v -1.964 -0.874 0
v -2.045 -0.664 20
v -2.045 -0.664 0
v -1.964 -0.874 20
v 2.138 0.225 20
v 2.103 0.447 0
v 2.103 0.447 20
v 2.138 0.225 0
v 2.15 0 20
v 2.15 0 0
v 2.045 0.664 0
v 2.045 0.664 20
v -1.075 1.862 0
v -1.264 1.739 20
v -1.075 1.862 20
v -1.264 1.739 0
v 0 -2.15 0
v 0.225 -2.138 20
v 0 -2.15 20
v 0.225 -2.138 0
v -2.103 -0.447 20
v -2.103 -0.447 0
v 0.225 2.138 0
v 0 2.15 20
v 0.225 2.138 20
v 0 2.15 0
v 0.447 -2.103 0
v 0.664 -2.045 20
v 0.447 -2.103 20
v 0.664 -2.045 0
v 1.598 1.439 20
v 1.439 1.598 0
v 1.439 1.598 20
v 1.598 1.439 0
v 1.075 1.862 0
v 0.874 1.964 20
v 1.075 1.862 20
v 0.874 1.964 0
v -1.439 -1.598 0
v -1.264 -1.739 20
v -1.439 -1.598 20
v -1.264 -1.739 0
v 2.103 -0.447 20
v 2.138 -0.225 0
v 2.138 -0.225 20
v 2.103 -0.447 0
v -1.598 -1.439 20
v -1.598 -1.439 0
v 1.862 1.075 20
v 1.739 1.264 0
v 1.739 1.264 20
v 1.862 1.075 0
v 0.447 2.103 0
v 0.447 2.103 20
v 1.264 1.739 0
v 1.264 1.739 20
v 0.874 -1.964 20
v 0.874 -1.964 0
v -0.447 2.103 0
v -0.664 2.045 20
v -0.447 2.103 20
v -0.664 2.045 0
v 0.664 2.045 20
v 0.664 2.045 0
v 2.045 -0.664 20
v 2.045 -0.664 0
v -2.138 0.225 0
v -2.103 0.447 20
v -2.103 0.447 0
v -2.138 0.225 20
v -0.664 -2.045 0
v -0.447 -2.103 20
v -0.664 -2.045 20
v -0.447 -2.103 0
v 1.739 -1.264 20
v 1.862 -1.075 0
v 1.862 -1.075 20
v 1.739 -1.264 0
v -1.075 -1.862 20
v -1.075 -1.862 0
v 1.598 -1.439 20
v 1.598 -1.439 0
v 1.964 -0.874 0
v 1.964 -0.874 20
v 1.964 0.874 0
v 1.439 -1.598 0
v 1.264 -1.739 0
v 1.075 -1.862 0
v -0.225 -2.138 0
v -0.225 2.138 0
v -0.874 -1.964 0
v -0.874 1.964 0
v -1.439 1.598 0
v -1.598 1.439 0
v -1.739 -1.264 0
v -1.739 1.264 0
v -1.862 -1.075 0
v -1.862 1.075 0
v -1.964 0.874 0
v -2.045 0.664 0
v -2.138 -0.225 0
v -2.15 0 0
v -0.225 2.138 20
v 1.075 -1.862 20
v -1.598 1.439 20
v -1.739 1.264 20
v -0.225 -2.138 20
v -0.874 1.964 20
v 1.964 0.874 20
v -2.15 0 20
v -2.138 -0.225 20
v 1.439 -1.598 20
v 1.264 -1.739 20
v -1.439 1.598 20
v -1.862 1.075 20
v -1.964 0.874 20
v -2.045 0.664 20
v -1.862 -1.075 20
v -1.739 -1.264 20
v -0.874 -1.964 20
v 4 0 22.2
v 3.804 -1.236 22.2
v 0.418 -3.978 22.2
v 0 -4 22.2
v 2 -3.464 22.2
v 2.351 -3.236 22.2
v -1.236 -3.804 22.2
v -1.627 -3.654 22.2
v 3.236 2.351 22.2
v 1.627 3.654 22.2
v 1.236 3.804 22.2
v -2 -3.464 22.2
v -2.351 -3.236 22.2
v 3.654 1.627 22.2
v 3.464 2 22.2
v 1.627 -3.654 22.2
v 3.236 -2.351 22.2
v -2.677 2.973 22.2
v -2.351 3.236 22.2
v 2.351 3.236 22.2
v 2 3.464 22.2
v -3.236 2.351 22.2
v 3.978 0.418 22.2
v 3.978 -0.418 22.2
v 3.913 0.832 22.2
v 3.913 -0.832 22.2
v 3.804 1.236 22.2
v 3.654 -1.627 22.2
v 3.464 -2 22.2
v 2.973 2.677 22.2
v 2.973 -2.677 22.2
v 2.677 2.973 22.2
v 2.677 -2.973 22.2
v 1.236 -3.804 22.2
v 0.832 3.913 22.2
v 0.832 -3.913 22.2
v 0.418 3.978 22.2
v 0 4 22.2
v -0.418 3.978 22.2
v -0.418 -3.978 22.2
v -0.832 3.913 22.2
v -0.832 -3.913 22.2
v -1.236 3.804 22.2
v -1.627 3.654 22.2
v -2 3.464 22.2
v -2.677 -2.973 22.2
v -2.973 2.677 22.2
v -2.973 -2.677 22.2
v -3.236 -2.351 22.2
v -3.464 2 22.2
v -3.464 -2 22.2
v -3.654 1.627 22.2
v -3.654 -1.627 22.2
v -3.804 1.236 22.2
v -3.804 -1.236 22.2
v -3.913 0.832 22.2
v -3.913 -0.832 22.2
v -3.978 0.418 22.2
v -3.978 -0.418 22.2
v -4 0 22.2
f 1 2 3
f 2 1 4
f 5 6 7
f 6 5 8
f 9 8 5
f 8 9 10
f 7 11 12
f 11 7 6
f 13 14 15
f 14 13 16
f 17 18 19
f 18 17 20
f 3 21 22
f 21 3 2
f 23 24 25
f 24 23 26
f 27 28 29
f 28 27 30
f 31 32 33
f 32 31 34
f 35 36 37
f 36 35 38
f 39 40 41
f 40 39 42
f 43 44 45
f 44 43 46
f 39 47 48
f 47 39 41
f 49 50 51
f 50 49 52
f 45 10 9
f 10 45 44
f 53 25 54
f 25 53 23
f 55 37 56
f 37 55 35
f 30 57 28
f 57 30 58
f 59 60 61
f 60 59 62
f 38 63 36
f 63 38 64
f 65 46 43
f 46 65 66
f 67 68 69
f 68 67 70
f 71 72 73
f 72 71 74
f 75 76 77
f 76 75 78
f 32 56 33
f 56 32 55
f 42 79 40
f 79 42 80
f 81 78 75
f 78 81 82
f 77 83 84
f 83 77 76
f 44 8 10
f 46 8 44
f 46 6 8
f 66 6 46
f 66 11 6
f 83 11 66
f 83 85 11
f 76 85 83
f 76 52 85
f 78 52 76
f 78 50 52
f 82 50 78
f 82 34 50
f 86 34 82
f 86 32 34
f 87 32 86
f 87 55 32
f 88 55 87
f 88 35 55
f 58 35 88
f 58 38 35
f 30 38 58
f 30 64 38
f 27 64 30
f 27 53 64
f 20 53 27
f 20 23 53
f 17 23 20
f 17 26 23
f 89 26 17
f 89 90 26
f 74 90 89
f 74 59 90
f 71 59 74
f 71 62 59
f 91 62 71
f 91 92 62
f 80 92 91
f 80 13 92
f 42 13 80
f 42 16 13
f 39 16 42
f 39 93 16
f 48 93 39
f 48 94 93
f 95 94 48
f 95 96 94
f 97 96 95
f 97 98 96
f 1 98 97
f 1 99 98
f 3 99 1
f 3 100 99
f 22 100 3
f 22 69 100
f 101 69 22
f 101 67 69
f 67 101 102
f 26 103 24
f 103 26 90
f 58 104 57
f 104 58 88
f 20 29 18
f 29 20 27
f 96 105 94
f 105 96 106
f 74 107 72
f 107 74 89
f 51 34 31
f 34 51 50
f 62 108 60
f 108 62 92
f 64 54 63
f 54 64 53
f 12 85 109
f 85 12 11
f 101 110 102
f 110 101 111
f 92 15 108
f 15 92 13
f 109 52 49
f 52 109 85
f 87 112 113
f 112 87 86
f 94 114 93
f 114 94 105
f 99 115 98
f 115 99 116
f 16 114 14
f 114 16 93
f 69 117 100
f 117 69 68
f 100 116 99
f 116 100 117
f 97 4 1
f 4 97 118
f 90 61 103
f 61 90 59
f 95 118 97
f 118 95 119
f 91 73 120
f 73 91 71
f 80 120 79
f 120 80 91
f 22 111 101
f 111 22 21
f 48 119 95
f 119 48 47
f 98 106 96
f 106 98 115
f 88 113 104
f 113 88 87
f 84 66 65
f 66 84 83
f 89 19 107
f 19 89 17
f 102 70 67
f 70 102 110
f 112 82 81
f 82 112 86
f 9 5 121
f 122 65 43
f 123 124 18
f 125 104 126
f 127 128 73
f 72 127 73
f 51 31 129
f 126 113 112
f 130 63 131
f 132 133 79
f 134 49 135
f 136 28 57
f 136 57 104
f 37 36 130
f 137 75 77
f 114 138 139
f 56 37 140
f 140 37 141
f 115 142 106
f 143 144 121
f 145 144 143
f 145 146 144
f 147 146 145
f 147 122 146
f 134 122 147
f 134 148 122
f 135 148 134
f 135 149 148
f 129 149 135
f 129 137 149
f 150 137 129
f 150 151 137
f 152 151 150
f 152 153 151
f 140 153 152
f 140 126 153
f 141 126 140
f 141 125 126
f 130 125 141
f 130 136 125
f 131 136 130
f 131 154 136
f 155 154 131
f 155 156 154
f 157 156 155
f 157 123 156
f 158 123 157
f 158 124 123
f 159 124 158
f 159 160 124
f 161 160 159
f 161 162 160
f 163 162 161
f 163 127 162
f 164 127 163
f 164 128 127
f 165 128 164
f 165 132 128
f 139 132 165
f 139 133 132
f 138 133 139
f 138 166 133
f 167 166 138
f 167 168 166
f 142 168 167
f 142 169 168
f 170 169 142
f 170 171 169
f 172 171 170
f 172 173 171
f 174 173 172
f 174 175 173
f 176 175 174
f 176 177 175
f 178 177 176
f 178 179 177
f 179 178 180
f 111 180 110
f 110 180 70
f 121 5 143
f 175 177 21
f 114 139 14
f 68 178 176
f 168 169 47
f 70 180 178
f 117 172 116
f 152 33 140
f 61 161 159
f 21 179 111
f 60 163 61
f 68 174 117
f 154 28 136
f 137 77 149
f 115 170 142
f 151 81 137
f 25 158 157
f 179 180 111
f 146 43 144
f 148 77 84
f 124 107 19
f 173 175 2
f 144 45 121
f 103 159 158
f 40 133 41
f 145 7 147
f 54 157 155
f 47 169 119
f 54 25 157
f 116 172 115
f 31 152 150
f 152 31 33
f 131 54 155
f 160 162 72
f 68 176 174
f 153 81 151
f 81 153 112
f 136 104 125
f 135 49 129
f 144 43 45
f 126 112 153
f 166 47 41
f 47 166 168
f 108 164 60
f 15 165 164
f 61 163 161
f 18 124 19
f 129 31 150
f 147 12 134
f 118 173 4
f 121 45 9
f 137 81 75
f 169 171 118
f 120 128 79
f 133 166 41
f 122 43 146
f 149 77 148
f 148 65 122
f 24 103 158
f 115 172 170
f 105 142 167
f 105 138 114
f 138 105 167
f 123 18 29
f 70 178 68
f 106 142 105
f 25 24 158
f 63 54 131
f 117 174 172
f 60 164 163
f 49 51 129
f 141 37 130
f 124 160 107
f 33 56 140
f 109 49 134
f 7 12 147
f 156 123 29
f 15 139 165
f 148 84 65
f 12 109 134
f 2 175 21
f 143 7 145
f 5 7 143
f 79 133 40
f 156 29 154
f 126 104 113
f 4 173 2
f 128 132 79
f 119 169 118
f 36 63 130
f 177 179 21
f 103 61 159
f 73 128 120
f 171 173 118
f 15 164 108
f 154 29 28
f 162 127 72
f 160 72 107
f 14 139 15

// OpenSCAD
// Countersunk screw with 90-degree conical head.
$fn = 60;
eps = 0.02;
shaft_d = 4.3;
head_d = 8;
head_h = 2.2;
shaft_l = 20;
union() {
    cylinder(d = shaft_d, h = shaft_l);
    translate([0, 0, shaft_l]) cylinder(d1 = shaft_d, d2 = head_d, h = head_h);
}
